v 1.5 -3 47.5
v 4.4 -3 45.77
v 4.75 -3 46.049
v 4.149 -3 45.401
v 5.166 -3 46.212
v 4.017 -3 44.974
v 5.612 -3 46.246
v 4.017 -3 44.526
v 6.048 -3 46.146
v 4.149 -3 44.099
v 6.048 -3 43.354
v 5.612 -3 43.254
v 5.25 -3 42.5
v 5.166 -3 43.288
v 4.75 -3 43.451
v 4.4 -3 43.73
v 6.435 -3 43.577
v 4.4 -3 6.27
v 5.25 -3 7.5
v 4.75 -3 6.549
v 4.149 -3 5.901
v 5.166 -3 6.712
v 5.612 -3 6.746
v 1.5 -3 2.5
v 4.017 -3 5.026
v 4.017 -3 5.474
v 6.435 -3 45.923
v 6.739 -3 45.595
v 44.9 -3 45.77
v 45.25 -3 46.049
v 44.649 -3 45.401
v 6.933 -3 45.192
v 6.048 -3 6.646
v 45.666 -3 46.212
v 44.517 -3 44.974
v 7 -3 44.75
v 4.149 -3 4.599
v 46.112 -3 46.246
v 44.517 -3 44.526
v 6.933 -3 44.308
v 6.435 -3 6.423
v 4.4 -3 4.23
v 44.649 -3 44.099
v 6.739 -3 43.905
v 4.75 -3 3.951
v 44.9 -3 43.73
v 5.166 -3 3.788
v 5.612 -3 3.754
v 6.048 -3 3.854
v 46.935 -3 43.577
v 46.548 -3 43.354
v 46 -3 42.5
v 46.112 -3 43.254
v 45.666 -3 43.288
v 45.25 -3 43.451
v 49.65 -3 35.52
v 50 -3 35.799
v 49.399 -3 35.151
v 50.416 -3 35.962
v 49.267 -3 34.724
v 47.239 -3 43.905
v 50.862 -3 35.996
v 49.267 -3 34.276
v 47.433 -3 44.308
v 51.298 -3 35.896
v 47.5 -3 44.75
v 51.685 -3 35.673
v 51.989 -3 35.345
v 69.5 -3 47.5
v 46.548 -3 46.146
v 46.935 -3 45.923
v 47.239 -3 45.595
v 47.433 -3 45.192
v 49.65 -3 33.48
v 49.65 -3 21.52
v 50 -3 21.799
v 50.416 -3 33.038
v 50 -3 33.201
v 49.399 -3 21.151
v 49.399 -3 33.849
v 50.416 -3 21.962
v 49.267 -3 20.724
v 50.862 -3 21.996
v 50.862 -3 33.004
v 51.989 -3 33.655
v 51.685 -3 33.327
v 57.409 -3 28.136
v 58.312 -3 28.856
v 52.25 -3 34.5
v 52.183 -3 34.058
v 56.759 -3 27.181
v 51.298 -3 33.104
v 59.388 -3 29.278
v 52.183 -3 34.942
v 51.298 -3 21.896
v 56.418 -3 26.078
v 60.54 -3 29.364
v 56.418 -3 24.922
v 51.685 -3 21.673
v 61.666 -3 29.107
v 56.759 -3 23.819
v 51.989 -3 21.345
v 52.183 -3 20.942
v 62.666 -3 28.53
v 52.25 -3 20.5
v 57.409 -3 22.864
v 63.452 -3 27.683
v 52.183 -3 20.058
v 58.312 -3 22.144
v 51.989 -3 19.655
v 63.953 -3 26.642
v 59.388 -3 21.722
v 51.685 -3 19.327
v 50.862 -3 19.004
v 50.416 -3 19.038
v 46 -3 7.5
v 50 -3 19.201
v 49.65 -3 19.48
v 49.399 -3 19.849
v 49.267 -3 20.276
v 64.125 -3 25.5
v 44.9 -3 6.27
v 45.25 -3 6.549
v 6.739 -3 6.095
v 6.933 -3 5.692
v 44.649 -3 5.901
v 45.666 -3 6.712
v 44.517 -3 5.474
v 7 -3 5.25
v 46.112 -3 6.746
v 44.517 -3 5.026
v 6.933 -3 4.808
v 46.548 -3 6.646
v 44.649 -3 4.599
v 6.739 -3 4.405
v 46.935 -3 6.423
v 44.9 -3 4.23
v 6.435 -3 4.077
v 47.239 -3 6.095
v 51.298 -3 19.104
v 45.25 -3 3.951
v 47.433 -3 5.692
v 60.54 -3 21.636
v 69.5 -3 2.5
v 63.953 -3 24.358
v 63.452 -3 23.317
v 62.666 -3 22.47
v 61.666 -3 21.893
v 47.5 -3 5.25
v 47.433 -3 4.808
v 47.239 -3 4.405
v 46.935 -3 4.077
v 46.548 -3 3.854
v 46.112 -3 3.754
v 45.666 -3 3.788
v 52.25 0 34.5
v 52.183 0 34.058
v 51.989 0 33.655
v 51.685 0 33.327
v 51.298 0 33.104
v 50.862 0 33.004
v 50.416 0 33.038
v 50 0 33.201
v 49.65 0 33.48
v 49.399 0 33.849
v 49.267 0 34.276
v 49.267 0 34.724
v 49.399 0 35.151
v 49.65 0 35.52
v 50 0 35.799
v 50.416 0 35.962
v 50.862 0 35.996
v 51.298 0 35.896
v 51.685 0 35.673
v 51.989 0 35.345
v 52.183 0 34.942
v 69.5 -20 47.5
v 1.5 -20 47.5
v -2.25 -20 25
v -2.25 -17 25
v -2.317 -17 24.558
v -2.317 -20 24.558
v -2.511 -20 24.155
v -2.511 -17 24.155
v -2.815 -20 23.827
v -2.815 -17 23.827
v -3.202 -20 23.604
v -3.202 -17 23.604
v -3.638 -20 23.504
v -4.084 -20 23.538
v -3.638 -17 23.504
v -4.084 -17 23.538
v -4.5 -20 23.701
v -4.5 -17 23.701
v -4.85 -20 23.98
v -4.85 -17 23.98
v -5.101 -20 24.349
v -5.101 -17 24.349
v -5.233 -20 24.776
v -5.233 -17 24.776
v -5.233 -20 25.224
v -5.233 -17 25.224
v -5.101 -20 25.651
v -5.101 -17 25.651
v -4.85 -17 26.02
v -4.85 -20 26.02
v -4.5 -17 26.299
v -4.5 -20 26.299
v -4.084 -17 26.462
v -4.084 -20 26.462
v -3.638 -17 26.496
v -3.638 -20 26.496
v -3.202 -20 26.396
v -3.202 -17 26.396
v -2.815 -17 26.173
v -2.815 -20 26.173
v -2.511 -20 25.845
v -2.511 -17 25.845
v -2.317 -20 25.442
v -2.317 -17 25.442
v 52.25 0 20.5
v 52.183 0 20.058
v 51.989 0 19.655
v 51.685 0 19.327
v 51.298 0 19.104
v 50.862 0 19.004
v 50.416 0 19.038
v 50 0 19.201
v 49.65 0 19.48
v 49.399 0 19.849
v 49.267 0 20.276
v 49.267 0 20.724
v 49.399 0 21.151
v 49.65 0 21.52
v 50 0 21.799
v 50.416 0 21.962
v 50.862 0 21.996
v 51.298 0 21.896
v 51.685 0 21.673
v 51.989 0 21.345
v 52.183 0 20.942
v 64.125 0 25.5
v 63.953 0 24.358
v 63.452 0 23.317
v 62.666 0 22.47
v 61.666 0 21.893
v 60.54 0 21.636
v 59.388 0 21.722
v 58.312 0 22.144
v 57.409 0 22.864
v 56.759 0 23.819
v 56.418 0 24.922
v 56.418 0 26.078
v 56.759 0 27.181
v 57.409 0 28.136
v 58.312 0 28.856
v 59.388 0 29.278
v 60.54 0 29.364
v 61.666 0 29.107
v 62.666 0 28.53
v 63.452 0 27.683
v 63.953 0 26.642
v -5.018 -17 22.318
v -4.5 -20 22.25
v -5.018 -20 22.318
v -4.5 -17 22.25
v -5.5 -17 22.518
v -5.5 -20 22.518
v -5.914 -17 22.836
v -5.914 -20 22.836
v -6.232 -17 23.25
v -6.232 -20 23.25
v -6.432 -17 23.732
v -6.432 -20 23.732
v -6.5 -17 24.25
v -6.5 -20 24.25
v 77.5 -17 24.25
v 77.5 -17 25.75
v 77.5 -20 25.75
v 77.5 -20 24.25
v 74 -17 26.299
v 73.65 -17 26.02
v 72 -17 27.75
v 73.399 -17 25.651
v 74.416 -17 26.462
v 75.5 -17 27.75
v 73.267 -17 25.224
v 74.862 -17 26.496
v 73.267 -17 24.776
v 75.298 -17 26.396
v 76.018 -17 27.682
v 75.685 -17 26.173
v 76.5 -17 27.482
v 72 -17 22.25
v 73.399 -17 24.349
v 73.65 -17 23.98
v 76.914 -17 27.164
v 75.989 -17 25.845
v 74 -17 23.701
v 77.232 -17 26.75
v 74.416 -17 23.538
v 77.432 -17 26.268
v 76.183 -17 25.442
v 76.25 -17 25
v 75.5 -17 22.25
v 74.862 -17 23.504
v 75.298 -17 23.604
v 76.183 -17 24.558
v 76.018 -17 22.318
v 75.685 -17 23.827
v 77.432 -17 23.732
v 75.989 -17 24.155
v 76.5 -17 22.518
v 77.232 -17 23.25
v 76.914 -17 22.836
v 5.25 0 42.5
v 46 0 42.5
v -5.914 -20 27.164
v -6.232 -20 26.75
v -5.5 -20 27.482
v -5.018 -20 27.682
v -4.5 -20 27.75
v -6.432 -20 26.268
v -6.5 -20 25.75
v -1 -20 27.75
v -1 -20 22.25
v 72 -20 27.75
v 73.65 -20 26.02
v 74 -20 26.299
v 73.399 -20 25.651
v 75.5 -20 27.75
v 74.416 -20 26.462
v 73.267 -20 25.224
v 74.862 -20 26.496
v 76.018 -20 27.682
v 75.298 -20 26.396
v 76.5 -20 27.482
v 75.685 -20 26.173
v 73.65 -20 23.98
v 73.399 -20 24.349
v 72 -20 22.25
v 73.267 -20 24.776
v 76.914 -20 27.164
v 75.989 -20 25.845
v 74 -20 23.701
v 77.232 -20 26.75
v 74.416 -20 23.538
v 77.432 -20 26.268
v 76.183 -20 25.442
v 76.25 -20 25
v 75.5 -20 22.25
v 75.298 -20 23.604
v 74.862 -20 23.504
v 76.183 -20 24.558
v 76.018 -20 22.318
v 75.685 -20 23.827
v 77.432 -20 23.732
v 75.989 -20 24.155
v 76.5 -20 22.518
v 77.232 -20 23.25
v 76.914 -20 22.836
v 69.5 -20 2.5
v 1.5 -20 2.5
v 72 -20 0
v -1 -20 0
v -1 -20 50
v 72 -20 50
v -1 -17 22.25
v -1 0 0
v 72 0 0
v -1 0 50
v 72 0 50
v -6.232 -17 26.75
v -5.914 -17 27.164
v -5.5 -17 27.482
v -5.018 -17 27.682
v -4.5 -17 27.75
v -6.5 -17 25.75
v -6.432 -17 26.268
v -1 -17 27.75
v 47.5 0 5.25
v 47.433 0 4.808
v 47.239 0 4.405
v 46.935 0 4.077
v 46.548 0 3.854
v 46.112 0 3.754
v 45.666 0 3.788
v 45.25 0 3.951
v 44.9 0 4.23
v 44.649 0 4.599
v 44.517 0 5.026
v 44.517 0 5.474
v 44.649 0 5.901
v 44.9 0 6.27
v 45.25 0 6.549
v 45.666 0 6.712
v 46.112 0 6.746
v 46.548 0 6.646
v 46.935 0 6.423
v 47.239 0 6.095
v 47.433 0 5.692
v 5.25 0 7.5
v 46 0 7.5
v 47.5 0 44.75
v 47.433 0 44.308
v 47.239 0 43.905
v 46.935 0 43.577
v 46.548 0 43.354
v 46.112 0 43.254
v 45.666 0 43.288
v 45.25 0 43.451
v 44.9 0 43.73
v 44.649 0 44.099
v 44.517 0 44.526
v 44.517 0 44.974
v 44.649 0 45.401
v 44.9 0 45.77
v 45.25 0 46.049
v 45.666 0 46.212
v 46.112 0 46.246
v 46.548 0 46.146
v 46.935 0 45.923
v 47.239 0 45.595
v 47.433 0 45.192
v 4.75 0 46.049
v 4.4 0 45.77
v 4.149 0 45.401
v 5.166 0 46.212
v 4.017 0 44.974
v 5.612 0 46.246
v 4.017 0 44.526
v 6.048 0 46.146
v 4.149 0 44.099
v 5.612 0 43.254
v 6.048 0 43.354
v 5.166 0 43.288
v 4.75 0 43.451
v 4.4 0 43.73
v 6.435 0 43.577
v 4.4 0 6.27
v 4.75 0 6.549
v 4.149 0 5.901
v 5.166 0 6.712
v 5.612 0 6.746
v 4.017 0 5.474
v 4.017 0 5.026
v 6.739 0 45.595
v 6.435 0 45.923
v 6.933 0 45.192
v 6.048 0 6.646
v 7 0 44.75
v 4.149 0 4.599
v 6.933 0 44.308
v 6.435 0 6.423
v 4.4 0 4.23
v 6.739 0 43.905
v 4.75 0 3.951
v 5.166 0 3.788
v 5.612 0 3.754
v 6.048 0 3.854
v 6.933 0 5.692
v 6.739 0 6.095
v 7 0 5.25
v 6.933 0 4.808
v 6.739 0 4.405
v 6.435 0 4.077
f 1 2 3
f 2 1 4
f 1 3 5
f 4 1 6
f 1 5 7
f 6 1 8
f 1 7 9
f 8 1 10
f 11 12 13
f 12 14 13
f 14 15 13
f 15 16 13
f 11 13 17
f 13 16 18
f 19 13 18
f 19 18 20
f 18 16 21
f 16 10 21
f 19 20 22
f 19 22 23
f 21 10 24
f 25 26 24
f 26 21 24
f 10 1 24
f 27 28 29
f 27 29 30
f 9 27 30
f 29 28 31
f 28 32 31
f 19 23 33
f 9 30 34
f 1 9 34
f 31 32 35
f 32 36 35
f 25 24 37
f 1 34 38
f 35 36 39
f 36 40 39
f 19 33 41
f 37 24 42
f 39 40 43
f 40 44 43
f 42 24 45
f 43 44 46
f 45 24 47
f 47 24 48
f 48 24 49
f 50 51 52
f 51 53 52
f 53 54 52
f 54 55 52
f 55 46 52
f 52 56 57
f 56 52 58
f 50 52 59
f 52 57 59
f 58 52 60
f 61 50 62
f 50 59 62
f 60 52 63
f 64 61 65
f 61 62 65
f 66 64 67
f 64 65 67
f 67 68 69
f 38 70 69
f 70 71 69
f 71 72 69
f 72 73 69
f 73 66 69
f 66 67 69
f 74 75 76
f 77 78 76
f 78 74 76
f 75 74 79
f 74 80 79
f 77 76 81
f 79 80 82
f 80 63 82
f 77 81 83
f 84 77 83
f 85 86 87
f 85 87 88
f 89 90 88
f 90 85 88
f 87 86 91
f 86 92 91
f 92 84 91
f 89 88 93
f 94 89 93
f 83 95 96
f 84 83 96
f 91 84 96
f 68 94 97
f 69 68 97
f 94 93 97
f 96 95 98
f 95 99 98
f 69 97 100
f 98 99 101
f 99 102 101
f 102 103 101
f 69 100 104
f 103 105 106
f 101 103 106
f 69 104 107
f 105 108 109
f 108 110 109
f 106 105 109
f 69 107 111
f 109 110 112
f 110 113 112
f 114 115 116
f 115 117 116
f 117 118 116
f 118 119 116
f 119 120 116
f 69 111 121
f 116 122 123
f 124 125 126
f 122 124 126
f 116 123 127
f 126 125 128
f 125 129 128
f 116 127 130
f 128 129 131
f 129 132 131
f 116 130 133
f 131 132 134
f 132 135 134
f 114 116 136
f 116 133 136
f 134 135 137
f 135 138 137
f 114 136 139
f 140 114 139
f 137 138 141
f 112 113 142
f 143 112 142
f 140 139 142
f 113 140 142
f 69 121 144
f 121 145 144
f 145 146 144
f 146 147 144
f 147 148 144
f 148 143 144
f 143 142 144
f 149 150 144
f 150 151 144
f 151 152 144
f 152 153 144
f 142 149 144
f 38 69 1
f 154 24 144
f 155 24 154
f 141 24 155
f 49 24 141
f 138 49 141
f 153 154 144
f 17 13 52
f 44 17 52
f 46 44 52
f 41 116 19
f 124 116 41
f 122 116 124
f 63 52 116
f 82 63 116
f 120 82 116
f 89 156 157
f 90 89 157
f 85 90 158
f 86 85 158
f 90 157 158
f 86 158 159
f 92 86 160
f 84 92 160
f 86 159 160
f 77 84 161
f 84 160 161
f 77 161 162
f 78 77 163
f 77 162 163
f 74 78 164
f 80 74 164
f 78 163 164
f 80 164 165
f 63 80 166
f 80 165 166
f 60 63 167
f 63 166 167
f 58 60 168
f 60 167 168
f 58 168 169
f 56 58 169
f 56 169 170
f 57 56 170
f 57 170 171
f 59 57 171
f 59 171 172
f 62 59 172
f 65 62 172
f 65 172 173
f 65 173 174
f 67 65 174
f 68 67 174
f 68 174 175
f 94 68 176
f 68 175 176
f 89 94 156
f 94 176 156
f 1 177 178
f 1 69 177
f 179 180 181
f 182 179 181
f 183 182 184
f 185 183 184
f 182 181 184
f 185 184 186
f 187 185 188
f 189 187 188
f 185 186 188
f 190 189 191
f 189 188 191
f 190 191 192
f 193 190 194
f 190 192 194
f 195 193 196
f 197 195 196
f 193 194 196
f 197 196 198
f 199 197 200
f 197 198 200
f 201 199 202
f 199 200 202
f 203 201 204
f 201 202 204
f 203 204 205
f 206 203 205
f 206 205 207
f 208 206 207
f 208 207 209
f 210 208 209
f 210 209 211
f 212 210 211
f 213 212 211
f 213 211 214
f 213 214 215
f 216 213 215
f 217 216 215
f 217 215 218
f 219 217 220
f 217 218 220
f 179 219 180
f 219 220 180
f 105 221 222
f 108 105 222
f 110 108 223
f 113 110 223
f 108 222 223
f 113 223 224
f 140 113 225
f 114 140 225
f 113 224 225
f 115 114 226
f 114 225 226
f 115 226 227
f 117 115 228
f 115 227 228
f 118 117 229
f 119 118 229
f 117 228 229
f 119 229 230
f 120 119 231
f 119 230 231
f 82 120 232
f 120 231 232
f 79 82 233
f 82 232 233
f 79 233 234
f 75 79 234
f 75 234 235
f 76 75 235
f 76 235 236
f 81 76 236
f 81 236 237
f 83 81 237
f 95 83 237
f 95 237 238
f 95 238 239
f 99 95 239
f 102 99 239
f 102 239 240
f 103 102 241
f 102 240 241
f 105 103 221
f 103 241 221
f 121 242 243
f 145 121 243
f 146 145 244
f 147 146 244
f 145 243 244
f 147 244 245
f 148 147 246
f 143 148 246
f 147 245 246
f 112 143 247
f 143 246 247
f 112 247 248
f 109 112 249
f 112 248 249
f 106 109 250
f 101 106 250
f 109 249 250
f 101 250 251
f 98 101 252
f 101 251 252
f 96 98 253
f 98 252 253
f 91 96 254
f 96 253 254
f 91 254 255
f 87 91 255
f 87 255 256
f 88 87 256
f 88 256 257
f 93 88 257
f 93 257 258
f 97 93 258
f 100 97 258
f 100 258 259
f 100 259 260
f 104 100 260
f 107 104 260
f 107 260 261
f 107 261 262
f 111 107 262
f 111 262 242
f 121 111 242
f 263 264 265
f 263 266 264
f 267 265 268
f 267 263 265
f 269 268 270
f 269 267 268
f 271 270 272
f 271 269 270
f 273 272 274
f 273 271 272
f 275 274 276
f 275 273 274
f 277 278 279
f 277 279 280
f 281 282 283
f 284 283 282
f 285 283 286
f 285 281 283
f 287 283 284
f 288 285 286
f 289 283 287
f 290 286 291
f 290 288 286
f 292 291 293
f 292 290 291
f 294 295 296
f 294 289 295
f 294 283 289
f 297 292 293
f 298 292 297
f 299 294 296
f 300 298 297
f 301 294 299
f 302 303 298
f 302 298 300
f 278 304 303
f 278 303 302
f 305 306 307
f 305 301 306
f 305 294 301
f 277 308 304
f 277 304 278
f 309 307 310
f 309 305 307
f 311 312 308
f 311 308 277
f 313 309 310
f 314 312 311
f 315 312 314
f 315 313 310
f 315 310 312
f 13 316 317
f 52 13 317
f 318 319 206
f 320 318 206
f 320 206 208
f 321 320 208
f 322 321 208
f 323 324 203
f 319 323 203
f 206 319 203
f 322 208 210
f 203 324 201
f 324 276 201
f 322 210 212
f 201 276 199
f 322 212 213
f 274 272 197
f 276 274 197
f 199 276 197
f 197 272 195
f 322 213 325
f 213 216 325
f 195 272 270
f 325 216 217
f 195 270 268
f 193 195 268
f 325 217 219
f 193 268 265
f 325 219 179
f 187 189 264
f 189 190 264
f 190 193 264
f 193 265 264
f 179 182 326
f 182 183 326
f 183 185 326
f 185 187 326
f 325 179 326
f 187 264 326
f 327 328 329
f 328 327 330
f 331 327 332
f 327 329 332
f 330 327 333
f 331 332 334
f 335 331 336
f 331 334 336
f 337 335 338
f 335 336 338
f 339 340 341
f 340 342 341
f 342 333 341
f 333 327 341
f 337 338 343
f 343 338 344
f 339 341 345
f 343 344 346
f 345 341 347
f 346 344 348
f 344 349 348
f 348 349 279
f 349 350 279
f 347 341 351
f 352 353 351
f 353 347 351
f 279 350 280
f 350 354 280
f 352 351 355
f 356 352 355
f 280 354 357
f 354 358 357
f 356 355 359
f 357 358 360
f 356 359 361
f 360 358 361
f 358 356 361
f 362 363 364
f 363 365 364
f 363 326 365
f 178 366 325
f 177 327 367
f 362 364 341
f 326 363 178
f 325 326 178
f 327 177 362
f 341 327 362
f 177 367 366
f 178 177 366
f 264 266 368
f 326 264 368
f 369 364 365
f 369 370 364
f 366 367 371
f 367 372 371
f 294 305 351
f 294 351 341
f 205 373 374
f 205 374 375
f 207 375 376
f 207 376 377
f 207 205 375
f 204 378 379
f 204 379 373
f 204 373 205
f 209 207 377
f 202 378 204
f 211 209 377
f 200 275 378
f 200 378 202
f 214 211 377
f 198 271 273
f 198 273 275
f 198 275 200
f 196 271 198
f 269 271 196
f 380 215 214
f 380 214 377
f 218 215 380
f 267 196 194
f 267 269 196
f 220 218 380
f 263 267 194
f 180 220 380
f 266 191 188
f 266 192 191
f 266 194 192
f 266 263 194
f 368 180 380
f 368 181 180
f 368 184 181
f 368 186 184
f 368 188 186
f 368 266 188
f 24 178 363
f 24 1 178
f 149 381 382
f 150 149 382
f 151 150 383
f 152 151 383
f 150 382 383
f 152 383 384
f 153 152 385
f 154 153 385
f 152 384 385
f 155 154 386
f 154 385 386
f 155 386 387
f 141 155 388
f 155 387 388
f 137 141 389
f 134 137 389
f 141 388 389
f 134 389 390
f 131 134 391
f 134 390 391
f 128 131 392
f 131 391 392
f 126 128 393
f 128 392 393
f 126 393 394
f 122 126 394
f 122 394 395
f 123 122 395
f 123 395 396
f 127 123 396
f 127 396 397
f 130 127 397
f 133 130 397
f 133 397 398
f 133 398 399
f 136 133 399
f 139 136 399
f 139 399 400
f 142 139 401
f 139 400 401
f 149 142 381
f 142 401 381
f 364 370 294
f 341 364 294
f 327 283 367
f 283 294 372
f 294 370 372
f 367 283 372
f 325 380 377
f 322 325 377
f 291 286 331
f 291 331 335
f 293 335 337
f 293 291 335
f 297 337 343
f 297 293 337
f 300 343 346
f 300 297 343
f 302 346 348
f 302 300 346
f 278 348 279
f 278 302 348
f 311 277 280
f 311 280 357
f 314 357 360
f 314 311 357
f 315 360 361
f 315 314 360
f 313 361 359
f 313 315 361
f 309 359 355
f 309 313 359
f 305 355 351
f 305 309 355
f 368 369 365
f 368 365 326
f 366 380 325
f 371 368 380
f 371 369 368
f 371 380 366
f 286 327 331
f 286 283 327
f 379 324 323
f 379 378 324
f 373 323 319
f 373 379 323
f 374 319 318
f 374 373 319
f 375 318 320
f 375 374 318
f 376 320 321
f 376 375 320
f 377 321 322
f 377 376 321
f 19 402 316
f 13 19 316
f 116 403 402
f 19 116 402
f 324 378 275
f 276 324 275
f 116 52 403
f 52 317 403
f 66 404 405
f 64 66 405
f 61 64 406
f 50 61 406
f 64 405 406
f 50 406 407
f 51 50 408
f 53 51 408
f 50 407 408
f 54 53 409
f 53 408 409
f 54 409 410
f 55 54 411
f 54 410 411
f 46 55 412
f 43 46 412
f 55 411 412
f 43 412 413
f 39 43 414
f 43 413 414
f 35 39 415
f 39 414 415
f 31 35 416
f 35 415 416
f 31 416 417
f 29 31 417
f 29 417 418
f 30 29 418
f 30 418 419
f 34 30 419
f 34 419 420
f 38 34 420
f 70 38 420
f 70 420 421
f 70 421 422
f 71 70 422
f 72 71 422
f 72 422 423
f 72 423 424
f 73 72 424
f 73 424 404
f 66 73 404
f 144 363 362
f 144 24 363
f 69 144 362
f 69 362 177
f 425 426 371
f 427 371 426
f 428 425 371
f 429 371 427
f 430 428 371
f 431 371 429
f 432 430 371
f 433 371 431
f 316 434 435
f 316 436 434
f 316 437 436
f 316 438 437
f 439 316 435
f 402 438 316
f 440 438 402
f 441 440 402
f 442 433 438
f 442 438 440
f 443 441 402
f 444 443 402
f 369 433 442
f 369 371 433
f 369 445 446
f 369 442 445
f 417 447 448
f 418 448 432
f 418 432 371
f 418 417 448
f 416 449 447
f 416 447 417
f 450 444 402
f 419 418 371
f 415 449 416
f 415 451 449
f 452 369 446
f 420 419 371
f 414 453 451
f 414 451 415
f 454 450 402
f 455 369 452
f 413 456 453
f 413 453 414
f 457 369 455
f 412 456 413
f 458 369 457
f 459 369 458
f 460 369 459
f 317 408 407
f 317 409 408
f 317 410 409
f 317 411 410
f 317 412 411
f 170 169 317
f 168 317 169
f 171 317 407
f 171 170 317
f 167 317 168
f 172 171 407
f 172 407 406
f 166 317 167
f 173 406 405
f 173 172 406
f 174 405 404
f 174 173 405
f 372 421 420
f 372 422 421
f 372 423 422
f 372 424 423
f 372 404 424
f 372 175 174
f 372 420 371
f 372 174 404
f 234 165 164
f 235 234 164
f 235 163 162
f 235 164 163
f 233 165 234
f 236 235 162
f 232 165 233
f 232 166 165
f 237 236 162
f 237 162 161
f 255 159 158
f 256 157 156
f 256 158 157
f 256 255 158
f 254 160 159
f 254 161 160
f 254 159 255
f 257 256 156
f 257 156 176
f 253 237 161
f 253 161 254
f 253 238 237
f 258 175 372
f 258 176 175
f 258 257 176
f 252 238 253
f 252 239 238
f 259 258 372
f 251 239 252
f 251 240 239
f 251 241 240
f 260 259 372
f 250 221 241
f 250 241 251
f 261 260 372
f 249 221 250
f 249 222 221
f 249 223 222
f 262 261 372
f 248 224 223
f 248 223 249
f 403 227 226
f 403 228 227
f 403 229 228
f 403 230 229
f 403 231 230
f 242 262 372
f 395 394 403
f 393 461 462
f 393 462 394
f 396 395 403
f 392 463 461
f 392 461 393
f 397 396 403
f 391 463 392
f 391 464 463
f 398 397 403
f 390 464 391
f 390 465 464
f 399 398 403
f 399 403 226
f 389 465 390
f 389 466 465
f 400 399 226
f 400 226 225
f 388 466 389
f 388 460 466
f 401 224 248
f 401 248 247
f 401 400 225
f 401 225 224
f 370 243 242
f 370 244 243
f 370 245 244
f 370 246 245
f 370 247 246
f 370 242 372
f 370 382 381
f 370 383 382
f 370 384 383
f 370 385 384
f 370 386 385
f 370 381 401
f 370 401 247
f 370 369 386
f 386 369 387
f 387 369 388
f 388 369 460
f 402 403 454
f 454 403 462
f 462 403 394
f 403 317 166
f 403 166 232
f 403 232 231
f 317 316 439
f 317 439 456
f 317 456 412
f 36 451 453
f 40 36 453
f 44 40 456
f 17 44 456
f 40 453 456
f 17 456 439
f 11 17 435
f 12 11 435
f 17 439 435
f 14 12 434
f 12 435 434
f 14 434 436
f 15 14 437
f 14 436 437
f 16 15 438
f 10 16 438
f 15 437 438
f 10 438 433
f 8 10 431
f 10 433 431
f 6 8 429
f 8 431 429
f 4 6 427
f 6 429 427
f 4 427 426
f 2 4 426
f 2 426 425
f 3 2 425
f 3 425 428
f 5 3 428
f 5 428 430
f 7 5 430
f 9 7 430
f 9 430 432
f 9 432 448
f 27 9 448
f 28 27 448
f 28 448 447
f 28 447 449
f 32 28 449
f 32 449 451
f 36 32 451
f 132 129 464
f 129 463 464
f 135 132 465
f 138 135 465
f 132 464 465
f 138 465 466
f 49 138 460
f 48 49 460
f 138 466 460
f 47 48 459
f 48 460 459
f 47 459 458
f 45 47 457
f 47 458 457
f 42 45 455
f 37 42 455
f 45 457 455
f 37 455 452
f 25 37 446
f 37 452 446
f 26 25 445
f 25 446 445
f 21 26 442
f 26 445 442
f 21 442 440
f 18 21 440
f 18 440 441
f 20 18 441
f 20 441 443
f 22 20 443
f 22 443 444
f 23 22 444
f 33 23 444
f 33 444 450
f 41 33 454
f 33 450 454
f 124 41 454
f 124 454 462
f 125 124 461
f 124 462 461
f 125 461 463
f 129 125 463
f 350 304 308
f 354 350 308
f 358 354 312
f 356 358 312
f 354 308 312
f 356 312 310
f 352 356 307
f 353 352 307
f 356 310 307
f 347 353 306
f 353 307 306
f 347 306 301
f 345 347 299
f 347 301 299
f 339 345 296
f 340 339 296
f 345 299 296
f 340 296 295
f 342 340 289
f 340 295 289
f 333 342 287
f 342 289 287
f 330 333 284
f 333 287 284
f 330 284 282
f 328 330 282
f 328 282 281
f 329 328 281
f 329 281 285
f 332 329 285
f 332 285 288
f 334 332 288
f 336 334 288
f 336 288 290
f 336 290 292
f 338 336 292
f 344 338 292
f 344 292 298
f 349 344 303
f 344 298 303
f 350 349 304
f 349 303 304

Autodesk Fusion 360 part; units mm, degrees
sketch "Sketch1" plane through (0, 0, 0) normal (0, 1, 0) x (1, 0, 0)
  line L0 (72, -50) -> (-1, -50)
  line L1 (1.5, -2.5) -> (69.5, -2.5)
  line L2 (69.5, -47.5) -> (1.5, -47.5)
  circle A0 centre (5.5, -5.25) radius 1.5
  circle A1 centre (5.5, -44.75) radius 1.5
  circle A2 centre (46, -5.25) radius 1.5
  circle A3 centre (46, -44.75) radius 1.5
  line L3 (46, -7.5) -> (5.25, -7.5)
  line L4 (5.25, -7.5) -> (5.25, -42.5)
  line L5 (5.25, -42.5) -> (46, -42.5)
  line L6 (46, -42.5) -> (46, -7.5)
  line L7 (46, -7.5) -> (5.25, -42.5) construction
  line L8 (5.25, -7.5) -> (46, -42.5) construction
  line L9 (72, 0) -> (-1, 0)
  line L10 (-1, 39.9342) -> (-1, -50)
  line L11 (1.5, -47.5) -> (1.5, -2.5)
  line L12 (67.25, -14.5) -> (48.25, -14.5)
  line L13 (48.25, -14.5) -> (48.25, -40.5)
  line L14 (48.25, -40.5) -> (67.25, -40.5)
  line L15 (67.25, -40.5) -> (67.25, -14.5)
  line L16 (67.25, -14.5) -> (48.25, -40.5) construction
  line L17 (48.25, -14.5) -> (67.25, -40.5) construction
  line L18 (67.25, -14.5) -> (60.25, -14.5)
  line L19 (69.5, -2.5) -> (69.5, -47.5)
  line L20 (72, 0) -> (72, -50)
  circle A4 centre (60.25, -25.5) radius 3.875
  line L21 (48.25, -14.5) -> (50.75, -14.5)
  circle A5 centre (50.75, -20.5) radius 1.5
  circle A6 centre (50.75, -34.5) radius 1.5
  point P0 (25.625, -25)
  point P1 (57.75, -27.5)
  dimension "d10" = 3
  dimension "d12" = 35
  dimension "d15" = 19
  dimension "d19" = 26
  dimension "d20" = 2.5
  dimension "d21" = 40.75
  dimension "d22" = 4
  dimension "d30" = 7.75
  dimension "d31" = 2.5
  dimension "d32" = 6
  dimension "d34" = 3
  dimension "d35" = 3
  dimension "d36" = 7
  dimension "d37" = 11
extrude "Extrude1" add sketch "Sketch1" against normal blind 3 contours L1 L2 L11 L19 | L12 L13 L14 L15 L18 L21
extrude "Extrude2" add sketch "Sketch1" against normal blind 20 contours L0 L9 L10 L20
sketch "Sketch2" plane through (0, 0, 0) normal (0, 1, 0) x (1, 0, 0)
  line L0 (72, 0) -> (72, -50)
  line L1 (72, -25) -> (72, -27.75)
  line L2 (72, -27.75) -> (75.5, -27.75)
  line L3 (77.5, -25.75) -> (77.5, -24.25)
  line L4 (75.5, -22.25) -> (72, -22.25)
  line L5 (72, -22.25) -> (72, -27.75)
  circle A0 centre (74.75, -25) radius 1.5
  line L6 (72, 0) -> (-1, 0)
  line L7 (35.5, 0) -> (35.5, -15)
  arc A1 (77.5, -24.25) -> (75.5, -22.25) centre (75.5, -24.25) ccw
  arc A2 (75.5, -27.75) -> (77.5, -25.75) centre (75.5, -25.75) ccw
  circle A3 centre (-3.75, -25) radius 1.5
  arc A4 (-6.5, -25.75) -> (-4.5, -27.75) centre (-4.5, -25.75) ccw
  arc A5 (-4.5, -22.25) -> (-6.5, -24.25) centre (-4.5, -24.25) ccw
  line L8 (-1, -22.25) -> (-1, -27.75)
  line L9 (-4.5, -22.25) -> (-1, -22.25)
  line L10 (-6.5, -25.75) -> (-6.5, -24.25)
  line L11 (-1, -27.75) -> (-4.5, -27.75)
  line L12 (-1, 0) -> (-1, -50)
  line L13 (-1, -25) -> (-1, -27.75)
  point P0 (77.5, -27.75)
  point P1 (-6.5, -27.75)
  dimension "d45" = 5.5
  dimension "d46" = 5.5
  dimension "d47" = 3
  dimension "d48" = 15
  dimension "d49" = 2
  dimension "d50" = 2
extrude "Extrude3" add sketch "Sketch2" against normal blind 20 contours A4 A5 L8 L9 L10 L11 L12 L13
extrude "Extrude4" cut sketch "Sketch2" against normal blind 17 contours A4 A5 L8 L9 L10 L11 L12 L13
extrude "Extrude5" add sketch "Sketch2" against normal blind 20 contours L0 L1 L2 L3 L4 L5 A1 A2
extrude "Extrude6" cut sketch "Sketch2" against normal blind 17 contours L0 L1 L2 L3 L4 L5 A1 A2
